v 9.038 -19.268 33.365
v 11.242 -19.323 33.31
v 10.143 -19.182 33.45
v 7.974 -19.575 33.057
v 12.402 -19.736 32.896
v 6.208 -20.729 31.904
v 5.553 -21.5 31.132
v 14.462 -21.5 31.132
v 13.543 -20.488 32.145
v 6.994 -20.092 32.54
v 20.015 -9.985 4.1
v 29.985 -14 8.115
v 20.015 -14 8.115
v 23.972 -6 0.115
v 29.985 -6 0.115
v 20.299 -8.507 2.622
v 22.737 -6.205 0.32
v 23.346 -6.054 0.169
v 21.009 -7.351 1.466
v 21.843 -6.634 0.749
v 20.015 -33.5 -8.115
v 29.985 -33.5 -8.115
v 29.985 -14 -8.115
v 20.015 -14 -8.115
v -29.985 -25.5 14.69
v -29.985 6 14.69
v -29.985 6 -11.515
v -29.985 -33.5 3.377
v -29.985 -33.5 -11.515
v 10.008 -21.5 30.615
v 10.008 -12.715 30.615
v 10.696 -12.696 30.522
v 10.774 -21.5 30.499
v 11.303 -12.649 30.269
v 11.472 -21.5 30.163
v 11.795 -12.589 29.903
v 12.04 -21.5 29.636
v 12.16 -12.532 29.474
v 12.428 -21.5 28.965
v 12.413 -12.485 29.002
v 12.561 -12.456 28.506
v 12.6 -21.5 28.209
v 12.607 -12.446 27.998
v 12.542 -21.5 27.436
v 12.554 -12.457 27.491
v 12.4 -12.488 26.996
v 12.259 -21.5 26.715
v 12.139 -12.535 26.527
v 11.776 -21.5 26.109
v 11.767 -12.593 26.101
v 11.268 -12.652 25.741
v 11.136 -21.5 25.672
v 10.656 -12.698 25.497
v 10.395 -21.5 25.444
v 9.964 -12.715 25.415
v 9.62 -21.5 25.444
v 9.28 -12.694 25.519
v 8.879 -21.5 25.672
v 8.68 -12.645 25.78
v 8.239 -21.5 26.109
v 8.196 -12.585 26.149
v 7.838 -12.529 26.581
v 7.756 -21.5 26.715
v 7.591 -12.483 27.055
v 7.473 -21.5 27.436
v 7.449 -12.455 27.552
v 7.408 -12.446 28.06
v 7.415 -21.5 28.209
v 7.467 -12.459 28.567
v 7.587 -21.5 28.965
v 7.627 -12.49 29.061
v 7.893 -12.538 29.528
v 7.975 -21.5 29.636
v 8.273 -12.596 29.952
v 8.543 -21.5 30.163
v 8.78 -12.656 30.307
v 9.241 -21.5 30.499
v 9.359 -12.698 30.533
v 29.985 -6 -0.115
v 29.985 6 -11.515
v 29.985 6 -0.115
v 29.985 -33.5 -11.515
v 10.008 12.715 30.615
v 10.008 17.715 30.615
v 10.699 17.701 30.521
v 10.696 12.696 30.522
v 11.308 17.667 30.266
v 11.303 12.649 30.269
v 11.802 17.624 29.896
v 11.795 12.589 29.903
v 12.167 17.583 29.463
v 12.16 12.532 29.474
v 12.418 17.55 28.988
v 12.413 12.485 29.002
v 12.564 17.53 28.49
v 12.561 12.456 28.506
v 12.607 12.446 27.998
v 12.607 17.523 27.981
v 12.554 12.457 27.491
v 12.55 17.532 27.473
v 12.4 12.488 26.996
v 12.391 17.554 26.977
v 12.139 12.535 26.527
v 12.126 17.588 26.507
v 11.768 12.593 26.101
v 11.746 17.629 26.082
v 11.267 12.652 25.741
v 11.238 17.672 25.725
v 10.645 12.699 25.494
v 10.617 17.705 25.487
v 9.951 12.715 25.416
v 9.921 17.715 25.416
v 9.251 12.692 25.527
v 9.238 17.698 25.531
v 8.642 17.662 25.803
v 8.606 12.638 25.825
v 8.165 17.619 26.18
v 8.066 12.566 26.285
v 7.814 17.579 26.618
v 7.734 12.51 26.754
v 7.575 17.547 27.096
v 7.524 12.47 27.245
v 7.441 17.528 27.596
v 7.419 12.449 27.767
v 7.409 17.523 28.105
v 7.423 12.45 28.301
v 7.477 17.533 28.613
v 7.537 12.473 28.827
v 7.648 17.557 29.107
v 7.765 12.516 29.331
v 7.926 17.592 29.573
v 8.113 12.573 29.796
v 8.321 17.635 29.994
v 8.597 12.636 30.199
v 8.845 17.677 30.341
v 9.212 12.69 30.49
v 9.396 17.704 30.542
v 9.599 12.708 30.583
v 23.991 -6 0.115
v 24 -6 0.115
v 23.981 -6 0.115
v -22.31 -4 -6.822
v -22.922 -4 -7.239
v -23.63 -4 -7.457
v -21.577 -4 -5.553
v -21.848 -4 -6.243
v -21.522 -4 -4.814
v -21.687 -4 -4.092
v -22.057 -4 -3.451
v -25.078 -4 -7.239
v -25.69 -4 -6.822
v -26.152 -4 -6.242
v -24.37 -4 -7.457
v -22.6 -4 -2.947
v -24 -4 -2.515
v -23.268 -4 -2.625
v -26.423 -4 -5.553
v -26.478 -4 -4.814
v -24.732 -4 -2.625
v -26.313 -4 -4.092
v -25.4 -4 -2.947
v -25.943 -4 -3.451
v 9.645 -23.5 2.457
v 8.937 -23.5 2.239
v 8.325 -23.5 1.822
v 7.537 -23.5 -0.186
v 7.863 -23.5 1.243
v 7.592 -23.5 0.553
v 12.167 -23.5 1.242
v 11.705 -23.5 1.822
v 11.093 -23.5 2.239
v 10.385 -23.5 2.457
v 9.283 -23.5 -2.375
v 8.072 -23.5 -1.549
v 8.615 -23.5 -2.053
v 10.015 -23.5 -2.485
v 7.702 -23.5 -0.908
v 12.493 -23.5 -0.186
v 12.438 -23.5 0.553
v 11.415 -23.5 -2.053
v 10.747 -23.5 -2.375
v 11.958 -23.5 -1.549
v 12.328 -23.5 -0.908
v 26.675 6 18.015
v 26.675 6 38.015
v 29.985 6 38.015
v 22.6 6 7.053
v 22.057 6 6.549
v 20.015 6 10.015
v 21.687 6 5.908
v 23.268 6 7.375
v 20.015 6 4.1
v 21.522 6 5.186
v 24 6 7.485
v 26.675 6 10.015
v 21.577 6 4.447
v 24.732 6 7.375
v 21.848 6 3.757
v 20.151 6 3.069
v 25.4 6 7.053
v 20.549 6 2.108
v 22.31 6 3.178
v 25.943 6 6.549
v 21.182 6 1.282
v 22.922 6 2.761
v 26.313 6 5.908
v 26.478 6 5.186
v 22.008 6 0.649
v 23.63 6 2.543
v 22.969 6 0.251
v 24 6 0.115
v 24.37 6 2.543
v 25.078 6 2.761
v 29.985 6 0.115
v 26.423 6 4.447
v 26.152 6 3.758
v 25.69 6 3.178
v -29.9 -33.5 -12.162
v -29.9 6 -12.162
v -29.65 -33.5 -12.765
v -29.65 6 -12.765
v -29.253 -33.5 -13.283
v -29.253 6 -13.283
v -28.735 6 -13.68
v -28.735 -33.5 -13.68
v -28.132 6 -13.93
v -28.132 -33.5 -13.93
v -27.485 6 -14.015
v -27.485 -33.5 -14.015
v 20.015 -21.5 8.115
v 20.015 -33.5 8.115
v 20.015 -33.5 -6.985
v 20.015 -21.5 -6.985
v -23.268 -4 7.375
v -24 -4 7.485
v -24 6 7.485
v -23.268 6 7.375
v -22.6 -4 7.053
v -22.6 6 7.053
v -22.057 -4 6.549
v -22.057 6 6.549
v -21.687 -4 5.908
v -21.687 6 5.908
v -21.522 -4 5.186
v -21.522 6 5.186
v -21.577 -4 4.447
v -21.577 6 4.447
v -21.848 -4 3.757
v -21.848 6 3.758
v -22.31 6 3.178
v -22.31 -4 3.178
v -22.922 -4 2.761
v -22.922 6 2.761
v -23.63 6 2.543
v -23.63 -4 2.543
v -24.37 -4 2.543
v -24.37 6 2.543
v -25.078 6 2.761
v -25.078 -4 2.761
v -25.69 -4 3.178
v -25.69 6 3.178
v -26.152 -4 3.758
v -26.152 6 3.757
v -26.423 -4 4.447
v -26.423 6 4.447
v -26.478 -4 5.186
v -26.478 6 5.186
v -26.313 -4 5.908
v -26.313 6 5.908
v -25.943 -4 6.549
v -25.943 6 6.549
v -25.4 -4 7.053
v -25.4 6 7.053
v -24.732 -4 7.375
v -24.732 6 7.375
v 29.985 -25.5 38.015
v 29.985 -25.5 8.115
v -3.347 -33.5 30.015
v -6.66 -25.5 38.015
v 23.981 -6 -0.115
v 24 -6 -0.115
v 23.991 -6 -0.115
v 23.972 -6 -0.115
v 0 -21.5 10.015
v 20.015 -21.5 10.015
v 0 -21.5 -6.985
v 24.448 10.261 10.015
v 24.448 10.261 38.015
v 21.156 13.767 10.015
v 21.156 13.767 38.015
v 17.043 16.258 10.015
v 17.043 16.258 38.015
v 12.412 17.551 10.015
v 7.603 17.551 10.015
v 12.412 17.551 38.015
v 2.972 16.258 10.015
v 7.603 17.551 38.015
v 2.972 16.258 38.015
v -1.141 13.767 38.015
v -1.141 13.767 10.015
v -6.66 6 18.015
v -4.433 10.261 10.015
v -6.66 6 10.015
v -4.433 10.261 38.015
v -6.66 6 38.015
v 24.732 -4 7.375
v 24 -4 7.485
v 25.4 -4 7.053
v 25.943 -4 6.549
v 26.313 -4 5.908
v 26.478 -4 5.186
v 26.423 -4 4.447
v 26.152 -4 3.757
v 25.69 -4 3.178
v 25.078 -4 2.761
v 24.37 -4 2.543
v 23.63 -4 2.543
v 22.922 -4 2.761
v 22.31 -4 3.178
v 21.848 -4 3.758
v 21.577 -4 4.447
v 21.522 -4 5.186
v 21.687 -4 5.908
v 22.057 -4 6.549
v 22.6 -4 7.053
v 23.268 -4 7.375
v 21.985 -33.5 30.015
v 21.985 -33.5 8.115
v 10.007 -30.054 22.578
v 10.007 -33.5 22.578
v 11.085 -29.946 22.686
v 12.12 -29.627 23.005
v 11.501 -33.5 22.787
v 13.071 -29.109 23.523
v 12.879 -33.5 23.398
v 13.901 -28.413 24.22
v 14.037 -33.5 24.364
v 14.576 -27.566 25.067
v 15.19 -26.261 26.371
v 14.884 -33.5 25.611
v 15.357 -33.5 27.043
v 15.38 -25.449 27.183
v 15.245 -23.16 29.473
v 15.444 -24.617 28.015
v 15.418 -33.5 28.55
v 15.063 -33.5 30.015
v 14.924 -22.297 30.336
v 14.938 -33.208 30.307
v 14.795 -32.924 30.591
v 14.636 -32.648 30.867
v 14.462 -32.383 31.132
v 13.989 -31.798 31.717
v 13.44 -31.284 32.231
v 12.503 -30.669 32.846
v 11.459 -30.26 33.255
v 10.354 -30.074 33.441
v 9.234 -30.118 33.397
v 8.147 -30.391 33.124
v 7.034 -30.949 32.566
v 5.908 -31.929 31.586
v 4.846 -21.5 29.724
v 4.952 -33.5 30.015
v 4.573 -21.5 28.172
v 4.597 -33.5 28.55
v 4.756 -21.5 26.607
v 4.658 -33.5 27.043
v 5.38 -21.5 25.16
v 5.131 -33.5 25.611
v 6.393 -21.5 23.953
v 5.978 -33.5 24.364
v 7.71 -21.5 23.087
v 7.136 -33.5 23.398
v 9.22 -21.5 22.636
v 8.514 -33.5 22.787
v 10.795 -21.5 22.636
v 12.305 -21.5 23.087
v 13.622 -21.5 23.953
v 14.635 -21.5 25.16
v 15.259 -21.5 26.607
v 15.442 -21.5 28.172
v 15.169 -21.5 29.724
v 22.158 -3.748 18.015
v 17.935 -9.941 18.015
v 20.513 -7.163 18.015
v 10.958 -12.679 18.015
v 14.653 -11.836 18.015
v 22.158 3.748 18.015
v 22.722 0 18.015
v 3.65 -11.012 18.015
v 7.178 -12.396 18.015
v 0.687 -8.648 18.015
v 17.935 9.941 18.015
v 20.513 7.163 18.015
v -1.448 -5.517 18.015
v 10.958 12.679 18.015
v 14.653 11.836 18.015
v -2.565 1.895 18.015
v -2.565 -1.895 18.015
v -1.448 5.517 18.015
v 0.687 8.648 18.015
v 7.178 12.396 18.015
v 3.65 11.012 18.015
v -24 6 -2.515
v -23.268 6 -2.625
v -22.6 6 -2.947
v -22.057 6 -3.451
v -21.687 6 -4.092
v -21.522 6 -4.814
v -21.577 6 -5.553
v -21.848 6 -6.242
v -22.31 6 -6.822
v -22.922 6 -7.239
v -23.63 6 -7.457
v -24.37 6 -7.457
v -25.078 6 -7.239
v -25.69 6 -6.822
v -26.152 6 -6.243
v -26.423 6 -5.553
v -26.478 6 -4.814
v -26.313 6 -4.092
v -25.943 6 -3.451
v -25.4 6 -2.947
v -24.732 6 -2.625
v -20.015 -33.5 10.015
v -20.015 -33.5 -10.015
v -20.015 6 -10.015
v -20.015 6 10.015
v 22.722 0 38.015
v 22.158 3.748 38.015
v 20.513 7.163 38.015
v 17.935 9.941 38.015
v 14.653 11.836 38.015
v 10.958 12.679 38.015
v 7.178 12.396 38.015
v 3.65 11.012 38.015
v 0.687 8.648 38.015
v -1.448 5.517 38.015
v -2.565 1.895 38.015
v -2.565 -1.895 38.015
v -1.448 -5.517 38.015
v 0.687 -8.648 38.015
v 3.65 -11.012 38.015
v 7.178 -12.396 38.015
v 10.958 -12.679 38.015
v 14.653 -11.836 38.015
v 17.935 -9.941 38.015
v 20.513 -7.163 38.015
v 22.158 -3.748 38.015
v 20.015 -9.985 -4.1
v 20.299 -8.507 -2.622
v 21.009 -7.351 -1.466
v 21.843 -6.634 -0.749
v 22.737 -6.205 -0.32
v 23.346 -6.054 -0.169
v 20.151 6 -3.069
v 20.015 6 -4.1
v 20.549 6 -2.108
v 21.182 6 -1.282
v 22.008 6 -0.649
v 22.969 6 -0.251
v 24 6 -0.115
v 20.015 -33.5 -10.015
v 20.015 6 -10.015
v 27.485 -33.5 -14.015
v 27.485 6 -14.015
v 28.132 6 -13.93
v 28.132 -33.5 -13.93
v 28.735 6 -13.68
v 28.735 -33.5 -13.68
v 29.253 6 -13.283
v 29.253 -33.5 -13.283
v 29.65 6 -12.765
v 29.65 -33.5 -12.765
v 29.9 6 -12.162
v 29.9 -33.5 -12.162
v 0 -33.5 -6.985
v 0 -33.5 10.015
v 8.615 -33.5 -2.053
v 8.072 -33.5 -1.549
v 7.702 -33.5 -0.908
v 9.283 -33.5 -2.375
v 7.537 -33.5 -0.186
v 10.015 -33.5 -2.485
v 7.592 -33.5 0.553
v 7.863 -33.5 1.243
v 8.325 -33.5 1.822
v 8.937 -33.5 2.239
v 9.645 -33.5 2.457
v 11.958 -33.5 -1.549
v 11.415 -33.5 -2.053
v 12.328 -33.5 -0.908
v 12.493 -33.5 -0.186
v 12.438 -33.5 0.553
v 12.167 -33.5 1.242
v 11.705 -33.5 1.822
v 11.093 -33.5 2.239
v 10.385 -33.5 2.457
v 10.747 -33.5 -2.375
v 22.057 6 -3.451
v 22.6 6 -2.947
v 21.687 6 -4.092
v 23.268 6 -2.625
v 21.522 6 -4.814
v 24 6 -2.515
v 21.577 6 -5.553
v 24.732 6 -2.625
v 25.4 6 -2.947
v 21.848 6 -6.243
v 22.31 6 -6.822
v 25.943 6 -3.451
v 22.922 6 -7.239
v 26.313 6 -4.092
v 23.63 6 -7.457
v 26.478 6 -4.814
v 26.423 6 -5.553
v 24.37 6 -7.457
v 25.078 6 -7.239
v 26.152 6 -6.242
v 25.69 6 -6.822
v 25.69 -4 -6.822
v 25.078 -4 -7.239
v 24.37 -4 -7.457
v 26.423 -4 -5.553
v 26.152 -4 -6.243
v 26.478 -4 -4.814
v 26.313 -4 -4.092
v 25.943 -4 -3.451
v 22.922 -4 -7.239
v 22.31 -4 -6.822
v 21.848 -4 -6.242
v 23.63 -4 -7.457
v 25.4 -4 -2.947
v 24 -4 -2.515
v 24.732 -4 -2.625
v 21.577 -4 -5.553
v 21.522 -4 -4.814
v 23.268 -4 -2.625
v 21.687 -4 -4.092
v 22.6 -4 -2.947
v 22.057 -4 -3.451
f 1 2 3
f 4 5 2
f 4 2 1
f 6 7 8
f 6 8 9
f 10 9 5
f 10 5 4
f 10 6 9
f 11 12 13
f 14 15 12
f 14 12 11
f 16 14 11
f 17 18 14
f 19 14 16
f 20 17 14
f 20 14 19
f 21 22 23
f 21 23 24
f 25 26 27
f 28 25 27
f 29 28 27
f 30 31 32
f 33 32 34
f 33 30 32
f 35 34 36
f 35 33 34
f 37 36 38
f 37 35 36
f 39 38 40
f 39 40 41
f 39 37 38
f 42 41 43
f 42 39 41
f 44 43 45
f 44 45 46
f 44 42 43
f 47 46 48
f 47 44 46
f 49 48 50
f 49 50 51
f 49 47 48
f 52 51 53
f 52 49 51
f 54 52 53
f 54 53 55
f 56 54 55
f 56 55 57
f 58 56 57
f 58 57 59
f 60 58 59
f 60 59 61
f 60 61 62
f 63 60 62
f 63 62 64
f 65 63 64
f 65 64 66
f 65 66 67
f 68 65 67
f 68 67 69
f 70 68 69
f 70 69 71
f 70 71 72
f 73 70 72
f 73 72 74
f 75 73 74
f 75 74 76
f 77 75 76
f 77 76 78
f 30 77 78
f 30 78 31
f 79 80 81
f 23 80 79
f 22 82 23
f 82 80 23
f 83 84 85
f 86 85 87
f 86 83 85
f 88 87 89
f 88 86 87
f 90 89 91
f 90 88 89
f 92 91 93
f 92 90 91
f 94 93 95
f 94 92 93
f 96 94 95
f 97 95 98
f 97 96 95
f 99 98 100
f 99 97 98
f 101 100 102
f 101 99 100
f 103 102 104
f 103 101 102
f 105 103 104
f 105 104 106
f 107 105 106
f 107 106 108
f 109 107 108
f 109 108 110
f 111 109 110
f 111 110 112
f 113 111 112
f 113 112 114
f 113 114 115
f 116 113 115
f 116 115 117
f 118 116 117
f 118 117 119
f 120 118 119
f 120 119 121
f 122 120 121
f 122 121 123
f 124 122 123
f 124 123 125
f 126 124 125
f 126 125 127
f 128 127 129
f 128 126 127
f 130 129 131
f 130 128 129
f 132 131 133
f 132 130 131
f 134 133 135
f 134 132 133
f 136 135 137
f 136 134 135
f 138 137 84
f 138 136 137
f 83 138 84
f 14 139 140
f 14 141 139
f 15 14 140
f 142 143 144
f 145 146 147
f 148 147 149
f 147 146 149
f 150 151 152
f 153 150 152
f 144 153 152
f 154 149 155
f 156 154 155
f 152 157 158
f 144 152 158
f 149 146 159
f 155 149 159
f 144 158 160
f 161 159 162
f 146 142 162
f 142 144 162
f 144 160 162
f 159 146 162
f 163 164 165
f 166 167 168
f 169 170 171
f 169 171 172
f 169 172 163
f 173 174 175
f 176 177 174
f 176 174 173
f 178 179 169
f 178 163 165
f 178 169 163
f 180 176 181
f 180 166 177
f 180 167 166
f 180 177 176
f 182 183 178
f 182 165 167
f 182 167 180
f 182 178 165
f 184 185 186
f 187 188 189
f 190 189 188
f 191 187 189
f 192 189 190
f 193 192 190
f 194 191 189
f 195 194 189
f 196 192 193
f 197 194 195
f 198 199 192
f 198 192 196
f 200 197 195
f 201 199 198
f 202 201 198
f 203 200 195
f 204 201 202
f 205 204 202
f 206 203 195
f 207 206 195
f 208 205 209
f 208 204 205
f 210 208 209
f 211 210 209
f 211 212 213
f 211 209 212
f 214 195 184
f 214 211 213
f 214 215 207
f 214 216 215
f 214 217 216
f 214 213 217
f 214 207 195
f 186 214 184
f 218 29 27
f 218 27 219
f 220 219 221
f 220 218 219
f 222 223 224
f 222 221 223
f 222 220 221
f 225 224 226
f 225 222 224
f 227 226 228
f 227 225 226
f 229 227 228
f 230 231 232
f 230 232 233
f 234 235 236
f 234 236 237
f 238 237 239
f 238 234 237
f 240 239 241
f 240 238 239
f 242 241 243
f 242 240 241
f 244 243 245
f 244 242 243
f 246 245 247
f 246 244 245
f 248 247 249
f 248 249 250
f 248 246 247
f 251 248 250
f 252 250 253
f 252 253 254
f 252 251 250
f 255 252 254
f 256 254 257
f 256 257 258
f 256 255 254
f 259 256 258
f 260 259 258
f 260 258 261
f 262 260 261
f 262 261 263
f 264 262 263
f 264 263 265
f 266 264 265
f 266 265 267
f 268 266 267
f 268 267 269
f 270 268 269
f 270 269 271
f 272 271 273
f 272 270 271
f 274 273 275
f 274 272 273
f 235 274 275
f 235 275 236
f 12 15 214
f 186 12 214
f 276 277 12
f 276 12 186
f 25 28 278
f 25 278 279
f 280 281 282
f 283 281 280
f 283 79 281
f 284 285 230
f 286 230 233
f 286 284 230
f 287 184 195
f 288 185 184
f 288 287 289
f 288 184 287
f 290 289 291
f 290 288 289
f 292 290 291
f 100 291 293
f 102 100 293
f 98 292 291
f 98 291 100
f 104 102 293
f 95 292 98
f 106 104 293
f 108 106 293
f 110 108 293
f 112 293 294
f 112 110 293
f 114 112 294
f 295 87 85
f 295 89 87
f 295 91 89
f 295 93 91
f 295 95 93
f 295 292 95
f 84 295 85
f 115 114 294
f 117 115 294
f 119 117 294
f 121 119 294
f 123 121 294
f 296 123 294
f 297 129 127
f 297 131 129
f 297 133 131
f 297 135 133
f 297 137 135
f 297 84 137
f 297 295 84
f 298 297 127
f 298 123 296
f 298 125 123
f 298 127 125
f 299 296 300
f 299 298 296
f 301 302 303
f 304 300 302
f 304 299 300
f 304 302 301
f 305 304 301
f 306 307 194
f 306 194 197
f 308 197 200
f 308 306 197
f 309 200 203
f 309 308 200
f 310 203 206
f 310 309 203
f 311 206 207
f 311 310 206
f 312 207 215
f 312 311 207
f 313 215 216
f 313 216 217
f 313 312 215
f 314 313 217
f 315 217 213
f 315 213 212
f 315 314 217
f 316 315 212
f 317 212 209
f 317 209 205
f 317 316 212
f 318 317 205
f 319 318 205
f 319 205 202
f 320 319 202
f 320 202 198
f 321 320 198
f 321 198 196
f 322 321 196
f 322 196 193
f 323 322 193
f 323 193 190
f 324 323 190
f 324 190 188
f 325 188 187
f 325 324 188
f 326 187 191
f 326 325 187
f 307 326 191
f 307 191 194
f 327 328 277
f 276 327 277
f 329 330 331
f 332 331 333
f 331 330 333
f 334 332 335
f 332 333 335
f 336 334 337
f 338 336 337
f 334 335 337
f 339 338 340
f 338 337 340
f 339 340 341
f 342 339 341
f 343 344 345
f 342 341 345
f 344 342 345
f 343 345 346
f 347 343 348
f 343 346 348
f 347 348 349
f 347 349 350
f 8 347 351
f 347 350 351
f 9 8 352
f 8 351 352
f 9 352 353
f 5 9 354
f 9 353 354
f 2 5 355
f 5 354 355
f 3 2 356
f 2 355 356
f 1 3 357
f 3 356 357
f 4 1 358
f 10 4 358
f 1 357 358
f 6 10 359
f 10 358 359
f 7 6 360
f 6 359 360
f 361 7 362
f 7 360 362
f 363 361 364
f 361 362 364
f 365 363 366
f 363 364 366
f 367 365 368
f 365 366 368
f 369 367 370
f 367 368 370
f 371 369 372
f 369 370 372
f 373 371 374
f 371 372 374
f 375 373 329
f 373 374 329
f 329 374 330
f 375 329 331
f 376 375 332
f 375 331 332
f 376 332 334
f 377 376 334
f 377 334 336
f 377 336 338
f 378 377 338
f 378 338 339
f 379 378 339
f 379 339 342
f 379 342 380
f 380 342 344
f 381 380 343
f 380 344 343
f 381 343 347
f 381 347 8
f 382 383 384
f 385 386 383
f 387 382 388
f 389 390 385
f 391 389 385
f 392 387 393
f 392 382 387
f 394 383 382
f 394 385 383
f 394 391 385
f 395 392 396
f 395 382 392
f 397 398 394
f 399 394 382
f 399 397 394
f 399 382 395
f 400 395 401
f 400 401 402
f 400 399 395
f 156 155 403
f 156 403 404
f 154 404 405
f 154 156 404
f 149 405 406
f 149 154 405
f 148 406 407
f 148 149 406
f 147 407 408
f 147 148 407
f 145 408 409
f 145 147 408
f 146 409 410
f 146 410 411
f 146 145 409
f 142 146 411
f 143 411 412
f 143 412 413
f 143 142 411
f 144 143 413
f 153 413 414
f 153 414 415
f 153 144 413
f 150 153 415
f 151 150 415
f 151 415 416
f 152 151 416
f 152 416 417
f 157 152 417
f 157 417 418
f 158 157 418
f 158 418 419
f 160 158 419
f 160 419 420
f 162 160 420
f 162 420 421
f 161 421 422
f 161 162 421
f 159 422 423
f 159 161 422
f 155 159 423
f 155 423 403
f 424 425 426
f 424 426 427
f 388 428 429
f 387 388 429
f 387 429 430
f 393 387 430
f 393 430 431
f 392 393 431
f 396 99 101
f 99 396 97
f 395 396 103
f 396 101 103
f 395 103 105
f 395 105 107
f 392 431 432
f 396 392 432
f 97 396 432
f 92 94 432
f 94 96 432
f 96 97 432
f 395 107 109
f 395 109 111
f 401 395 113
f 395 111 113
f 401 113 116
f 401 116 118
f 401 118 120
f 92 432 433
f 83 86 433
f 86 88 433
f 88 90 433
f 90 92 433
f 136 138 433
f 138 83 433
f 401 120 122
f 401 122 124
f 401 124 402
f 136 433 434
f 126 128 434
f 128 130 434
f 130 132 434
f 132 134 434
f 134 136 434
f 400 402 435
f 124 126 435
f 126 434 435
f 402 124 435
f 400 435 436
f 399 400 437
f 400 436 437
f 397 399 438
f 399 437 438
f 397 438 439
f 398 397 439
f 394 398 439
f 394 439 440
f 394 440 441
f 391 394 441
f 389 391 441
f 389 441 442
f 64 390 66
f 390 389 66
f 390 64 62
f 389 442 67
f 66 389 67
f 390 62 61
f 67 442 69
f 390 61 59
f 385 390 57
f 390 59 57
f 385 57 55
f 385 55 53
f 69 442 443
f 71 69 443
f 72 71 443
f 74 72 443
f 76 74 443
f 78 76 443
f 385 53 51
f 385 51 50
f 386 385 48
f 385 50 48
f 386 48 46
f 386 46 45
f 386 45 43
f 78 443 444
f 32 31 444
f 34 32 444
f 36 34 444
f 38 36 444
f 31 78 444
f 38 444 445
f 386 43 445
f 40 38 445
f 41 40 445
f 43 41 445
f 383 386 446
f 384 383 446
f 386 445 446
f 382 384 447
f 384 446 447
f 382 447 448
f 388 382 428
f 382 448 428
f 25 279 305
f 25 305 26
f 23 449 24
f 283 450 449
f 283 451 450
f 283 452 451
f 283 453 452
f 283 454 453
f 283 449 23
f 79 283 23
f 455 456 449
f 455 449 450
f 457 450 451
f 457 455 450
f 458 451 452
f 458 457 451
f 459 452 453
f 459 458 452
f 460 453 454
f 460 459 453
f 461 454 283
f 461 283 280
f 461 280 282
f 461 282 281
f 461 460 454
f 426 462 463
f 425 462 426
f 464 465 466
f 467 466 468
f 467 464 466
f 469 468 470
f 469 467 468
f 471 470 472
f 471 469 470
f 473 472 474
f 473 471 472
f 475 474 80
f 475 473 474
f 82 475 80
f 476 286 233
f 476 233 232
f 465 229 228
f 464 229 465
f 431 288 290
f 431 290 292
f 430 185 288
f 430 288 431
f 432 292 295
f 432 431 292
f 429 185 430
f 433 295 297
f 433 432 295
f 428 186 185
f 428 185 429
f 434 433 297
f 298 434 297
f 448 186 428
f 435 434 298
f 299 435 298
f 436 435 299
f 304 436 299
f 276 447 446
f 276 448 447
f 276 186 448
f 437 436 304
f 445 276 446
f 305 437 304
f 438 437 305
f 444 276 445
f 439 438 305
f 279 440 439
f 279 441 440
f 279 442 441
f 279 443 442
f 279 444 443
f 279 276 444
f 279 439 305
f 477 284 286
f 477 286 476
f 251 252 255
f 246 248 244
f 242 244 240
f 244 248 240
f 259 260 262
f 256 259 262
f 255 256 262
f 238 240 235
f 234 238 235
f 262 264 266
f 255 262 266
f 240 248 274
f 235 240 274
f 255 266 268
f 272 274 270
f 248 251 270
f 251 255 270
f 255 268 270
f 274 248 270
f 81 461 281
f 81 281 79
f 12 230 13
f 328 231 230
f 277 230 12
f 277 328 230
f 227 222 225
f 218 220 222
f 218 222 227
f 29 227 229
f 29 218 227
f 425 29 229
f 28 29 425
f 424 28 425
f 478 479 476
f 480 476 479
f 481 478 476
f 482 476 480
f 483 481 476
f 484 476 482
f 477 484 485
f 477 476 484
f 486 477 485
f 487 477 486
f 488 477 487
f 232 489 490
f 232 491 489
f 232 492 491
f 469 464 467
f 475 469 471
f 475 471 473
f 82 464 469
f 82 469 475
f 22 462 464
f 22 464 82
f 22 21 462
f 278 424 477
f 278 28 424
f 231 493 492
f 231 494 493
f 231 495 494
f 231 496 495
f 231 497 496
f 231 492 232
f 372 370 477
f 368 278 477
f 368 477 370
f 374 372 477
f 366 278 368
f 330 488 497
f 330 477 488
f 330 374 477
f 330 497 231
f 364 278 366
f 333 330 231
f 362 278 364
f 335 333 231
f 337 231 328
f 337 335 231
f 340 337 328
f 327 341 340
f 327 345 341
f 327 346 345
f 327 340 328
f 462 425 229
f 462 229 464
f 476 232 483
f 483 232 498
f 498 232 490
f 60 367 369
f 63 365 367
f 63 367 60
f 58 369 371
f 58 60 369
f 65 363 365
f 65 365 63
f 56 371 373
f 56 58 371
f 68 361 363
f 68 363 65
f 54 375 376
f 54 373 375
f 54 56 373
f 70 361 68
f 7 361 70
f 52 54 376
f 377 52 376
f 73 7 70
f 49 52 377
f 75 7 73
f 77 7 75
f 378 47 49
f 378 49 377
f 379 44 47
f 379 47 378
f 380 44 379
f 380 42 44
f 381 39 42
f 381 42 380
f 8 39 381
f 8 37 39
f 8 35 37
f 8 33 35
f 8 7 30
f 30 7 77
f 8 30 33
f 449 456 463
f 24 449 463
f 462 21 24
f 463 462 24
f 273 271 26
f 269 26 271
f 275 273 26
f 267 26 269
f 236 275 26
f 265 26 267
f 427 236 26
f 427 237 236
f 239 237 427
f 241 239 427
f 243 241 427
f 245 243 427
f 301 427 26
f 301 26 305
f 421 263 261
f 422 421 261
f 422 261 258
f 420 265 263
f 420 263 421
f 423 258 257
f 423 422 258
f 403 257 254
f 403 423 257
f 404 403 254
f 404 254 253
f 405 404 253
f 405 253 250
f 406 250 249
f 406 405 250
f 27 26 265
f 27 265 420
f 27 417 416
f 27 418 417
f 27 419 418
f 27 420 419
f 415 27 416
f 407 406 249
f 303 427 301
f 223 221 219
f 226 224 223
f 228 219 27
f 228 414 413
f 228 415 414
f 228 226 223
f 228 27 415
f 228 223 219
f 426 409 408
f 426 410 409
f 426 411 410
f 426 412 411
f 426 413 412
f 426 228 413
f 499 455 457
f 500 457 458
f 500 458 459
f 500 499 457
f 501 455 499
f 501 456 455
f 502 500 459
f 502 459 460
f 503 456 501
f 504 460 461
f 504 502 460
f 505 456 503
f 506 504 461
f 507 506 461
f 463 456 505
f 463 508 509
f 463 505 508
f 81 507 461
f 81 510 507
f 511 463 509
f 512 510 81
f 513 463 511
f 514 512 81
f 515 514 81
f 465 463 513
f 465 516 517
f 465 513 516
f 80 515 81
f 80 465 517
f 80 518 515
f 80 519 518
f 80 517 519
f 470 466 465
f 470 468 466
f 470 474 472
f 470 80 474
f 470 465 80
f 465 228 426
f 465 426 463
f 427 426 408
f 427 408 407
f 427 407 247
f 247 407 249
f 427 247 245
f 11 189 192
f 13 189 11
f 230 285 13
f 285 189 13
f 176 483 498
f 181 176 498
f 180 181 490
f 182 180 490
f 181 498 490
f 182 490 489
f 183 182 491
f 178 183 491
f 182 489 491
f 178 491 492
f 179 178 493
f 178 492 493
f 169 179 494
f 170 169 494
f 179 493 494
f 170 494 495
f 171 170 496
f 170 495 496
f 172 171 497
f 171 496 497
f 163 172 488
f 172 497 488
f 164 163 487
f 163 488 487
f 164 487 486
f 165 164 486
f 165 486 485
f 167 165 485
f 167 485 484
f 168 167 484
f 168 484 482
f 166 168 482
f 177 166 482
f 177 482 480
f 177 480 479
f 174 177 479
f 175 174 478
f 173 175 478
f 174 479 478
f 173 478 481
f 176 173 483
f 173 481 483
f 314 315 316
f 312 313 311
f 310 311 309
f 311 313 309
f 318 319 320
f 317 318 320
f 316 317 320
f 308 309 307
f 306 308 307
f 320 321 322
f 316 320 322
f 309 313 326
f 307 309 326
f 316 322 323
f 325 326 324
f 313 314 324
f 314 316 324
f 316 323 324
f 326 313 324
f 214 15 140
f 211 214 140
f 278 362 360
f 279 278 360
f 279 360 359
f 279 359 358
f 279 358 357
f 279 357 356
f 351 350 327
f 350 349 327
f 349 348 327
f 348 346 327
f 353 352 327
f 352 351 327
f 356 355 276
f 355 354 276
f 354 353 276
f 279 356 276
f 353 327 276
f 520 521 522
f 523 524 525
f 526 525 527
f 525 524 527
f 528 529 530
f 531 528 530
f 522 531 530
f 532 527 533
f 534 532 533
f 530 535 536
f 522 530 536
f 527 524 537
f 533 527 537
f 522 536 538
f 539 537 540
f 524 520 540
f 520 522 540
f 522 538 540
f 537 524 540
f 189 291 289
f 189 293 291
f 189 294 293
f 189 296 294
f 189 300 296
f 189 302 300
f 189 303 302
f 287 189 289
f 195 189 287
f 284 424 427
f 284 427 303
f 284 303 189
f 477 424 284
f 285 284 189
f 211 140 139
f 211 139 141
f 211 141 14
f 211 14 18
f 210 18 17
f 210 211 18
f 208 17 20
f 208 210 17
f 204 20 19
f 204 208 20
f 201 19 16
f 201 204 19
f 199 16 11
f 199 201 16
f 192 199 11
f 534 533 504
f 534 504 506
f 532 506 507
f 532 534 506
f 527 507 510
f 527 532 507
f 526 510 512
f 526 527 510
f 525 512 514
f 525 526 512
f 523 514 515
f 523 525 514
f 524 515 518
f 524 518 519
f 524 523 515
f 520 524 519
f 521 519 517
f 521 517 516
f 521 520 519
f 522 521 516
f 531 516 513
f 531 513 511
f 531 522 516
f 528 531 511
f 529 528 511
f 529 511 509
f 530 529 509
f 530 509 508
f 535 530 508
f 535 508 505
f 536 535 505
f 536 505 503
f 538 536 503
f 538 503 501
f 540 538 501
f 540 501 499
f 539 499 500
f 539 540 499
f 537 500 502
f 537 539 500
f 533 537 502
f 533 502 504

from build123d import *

# Parameters (mm, degrees)
SKETCH1_R               = 2.485
SKETCH1_W               = 55.97
SKETCH1_H               = 4
SKETCH1_W_2             = 2
BOSS_EXTRUDE1_DEPTH     = 6
SKETCH2_R               = 2.485
BOSS_EXTRUDE2_DEPTH     = 2
BOSS_EXTRUDE3_DEPTH     = 20.015
SKETCH6_R               = 2.485
CUT_EXTRUDE3_DEPTH      = 10
SKETCH11_R              = 17.715
BOSS_EXTRUDE4_DEPTH     = 8
BOSS_EXTRUDE5_START     = 20
SKETCH11_3_R            = 17.715
SKETCH11_3_R_2          = 12.715
BOSS_EXTRUDE5_DEPTH     = 20
BOSS_EXTRUDE7_DEPTH     = 20
CUT_EXTRUDE7_DEPTH      = 63.485922014
CUT_EXTRUDE7_DEPTH_BACK = 63.485922014
CUT_EXTRUDE8_DEPTH      = 72.185604057
CUT_EXTRUDE8_DEPTH_BACK = 72.185604057
FILLET1_R               = 2.5
CUT_EXTRUDE9_DEPTH      = 59.876909311
CUT_EXTRUDE9_DEPTH_BACK = 59.876909311
SKETCH16_R              = 2.6
SKETCH17_R              = 5.436873337
SKETCH17_R_2            = 2.6
CUT_EXTRUDE10_DEPTH     = 12
BOSS_EXTRUDE8_REACH     = 72.478
SKETCH18_R              = 5.436873337
CHAMFER1_SIZE           = 8
CHAMFER2_SIZE           = 8


# Some blends are built 0.0001 mm under size
with BuildPart() as part:
    # Sketch1 → Boss-Extrude1 (new, symmetric)
    # profile 1 of 8: a face of its own
    with BuildSketch(Plane(origin=(0, 0, 0), x_dir=(1, 0, 0), z_dir=(0, 1, 0))):
        with BuildLine():
            ThreePointArc((24, -0.115), (21.182179477, -1.282179477), (20.015, -4.1))
            Line((20.015, -4.1), (20.015, -10.015))
            Line((20.015, -10.015), (-20.015, -10.015))
            Line((-20.015, -10.015), (-20.015, 10.015))
            Line((-20.015, 10.015), (20.015, 10.015))
            Line((20.015, 10.015), (20.015, 4.1))
            ThreePointArc((20.015, 4.1), (21.182179477, 1.282179477), (24, 0.115))
            ThreePointArc((24, 0.115), (26.817820523, 1.282179477), (27.985, 4.1))
            Line((27.985, 4.1), (27.985, 14.015))
            Line((27.985, 14.015), (-27.985, 14.015))
            Line((-27.985, 14.015), (-27.985, -14.015))
            Line((-27.985, -14.015), (27.985, -14.015))
            Line((27.985, -14.015), (27.985, -4.1))
            ThreePointArc((27.985, -4.1), (26.817820523, -1.282179477), (24, -0.115))
        make_face()
        with Locations(Location((-24, -5, 0), (0, 0, 270))):
            Circle(SKETCH1_R, mode=Mode.SUBTRACT)
        with Locations(Location((-24, 5, 0), (0, 0, 270))):
            Circle(SKETCH1_R, mode=Mode.SUBTRACT)
        with Locations(Location((24, -5, 0), (0, 0, 270))):
            Circle(SKETCH1_R, mode=Mode.SUBTRACT)
        with Locations(Location((24, 5, 0), (0, 0, 270))):
            Circle(SKETCH1_R, mode=Mode.SUBTRACT)
    # profile 2 of 8: a face of its own
    with BuildSketch(Plane(origin=(0, 0, 0), x_dir=(1, 0, 0), z_dir=(0, 1, 0))):
        with Locations((0, -16.015)):
            Rectangle(SKETCH1_W, SKETCH1_H)
    # profile 3 of 8: a face of its own
    with BuildSketch(Plane(origin=(0, 0, 0), x_dir=(1, 0, 0), z_dir=(0, 1, 0))):
        Polygon((27.985, 4.1), (27.985, 0.115), (29.985, 0.115), (29.985, 14.015), (27.985, 14.015), align=None)
    # profile 4 of 8: a face of its own
    with BuildSketch(Plane(origin=(0, 0, 0), x_dir=(1, 0, 0), z_dir=(0, 1, 0))):
        Polygon((29.985, -0.115), (27.985, -0.115), (27.985, -4.1), (27.985, -14.015), (29.985, -14.015), align=None)
    # profile 5 of 8: a face of its own
    with BuildSketch(Plane(origin=(0, 0, 0), x_dir=(1, 0, 0), z_dir=(0, 1, 0))):
        with BuildLine():
            Line((27.985, -4.1), (27.985, -0.115))
            Line((27.985, -0.115), (24, -0.115))
            ThreePointArc((24, -0.115), (26.817820523, -1.282179477), (27.985, -4.1))
        make_face()
    # profile 6 of 8: a face of its own
    with BuildSketch(Plane(origin=(0, 0, 0), x_dir=(1, 0, 0), z_dir=(0, 1, 0))):
        with BuildLine():
            Line((24, 0.115), (27.985, 0.115))
            Line((27.985, 0.115), (27.985, 4.1))
            ThreePointArc((27.985, 4.1), (26.817820523, 1.282179477), (24, 0.115))
        make_face()
    # profile 7 of 8: a face of its own
    with BuildSketch(Plane(origin=(0, 0, 0), x_dir=(1, 0, 0), z_dir=(0, 1, 0))):
        with Locations((28.985, -16.015)):
            Rectangle(SKETCH1_W_2, SKETCH1_H)
    # profile 8 of 8: a face of its own
    with BuildSketch(Plane(origin=(0, 0, 0), x_dir=(1, 0, 0), z_dir=(0, 1, 0))):
        Polygon((-29.985, 14.015), (-29.985, -18.015), (-27.985, -18.015), (-27.985, -14.015), (-27.985, 14.015), align=None)
    extrude(amount=BOSS_EXTRUDE1_DEPTH, both=True)

    # Sketch2 → Boss-Extrude2 (add)
    with BuildSketch(Plane.XZ.offset(6)):
        with Locations(Location((24, -5, 0), (0, 0, 90))):
            Circle(SKETCH2_R)
        with Locations(Location((24, 5, 0), (0, 0, 90))):
            Circle(SKETCH2_R)
        with Locations(Location((-24, -5, 0), (0, 0, 90))):
            Circle(SKETCH2_R)
        with Locations(Location((-24, 5, 0), (0, 0, 90))):
            Circle(SKETCH2_R)
    extrude(amount=-BOSS_EXTRUDE2_DEPTH)

    # Sketch5 → Boss-Extrude3 (add)
    with BuildSketch(Plane(origin=(0, 0, 0), x_dir=(0, 0, -1), z_dir=(1, 0, 0))):
        Polygon((-18.015, -6), (-10.015, -6), (-10.015, -21.5), (6.985, -21.5), (6.985, -33.5), (-18.015, -33.5), align=None)
    extrude(amount=BOSS_EXTRUDE3_DEPTH)

    # Sketch6 → Cut-Extrude3 (cut)
    with BuildSketch(Plane.XZ.offset(33.5)):
        with Locations(Location((10.015, 0, 0), (0, 0, 270))):
            Circle(SKETCH6_R)
    extrude(amount=-CUT_EXTRUDE3_DEPTH, mode=Mode.SUBTRACT)

    # Sketch11 → Boss-Extrude4 (add)
    with BuildSketch(Plane.XY.offset(18.015)):
        with Locations((10.0075, 0)):
            Circle(SKETCH11_R)
    extrude(amount=-BOSS_EXTRUDE4_DEPTH)

    # Sketch11<3> → Boss-Extrude5 (add)
    with BuildSketch(Plane.XY.offset(18.015).offset(BOSS_EXTRUDE5_START)):
        with Locations((10.0075, 0)):
            Circle(SKETCH11_3_R)
        with Locations((10.0075, 0)):
            Circle(SKETCH11_3_R_2, mode=Mode.SUBTRACT)
    extrude(amount=-BOSS_EXTRUDE5_DEPTH)

    # Sketch13 → Boss-Extrude7 (add)
    with BuildSketch(Plane.XY.offset(38.015)):
        with BuildLine():
            ThreePointArc((20.015, -14.617495297), (10.0075, -17.715), (0, -14.617495297))
            Line((0, -14.617495297), (0, -33.5))
            Line((0, -33.5), (20.015, -33.5))
            Line((20.015, -33.5), (20.015, -14.617495297))
        make_face()
        with BuildLine():
            Line((-29.985, -6), (-6.660470032, -6))
            ThreePointArc((-6.660470032, -6), (-7.7075, 0), (-6.660470032, 6))
            Line((-6.660470032, 6), (-29.985, 6))
            Line((-29.985, 6), (-29.985, -6))
        make_face()
        with BuildLine():
            ThreePointArc((27.7225, 0), (27.458779525, -3.045335439), (26.675470032, -6))
            Line((26.675470032, -6), (29.985, -6))
            Line((29.985, -6), (29.985, 6))
            Line((29.985, 6), (26.675470032, 6))
            ThreePointArc((26.675470032, 6), (27.458779525, 3.045335439), (27.7225, 0))
        make_face()
    extrude(amount=-BOSS_EXTRUDE7_DEPTH)

    # Sketch14 → Cut-Extrude7 (cut, two sides: drawn at the far end of the back side and taken through both)
    with BuildSketch(Plane(origin=(0, 6, 0), x_dir=(1, 0, 0), z_dir=(0, 1, 0)).offset(-CUT_EXTRUDE7_DEPTH_BACK)):
        Polygon((-29.985, -38.015), (-6.660470032, -38.015), (-29.985, -14.690470032), align=None)
    extrude(amount=CUT_EXTRUDE7_DEPTH + CUT_EXTRUDE7_DEPTH_BACK, mode=Mode.SUBTRACT)

    # Sketch15 → Cut-Extrude8 (cut, two sides: drawn at the far end of the back side and taken through both)
    with BuildSketch(Plane(origin=(20.015, 0, 0), x_dir=(0, 0, -1), z_dir=(1, 0, 0)).offset(-CUT_EXTRUDE8_DEPTH_BACK)):
        Polygon((-19.132495297, -33.5), (-38.015, -14.617495297), (-38.015, -33.5), align=None)
    extrude(amount=CUT_EXTRUDE8_DEPTH + CUT_EXTRUDE8_DEPTH_BACK, mode=Mode.SUBTRACT)

    # Fillet1
    fillet1_edges = [part.edges().sort_by_distance(p)[0] for p in [
        (-29.985, 0, -14.015),
        (29.985, 0, -14.015),
    ]]
    fillet(fillet1_edges, radius=FILLET1_R)

    # Sketch16 → Cut-Extrude9 (cut, two sides: drawn at the far end of the back side and taken through both)
    with BuildSketch(Plane(origin=(0, 0, 0), x_dir=(1, 0, 0), z_dir=(0, 1, 0)).offset(-CUT_EXTRUDE9_DEPTH_BACK)):
        with Locations(Location((10.0075, -28.015, 0), (0, 0, 270))):
            Circle(SKETCH16_R)
    extrude(amount=CUT_EXTRUDE9_DEPTH + CUT_EXTRUDE9_DEPTH_BACK, mode=Mode.SUBTRACT)

    # Sketch17 → Cut-Extrude10 (cut)
    with BuildSketch(Plane.XZ.offset(33.5)):
        with Locations((10.0075, 28.015)):
            Circle(SKETCH17_R)
        with Locations(Location((10.0075, 28.015, 0), (0, 0, 90))):
            Circle(SKETCH17_R_2, mode=Mode.SUBTRACT)
    extrude(amount=-CUT_EXTRUDE10_DEPTH, mode=Mode.SUBTRACT)

    # Sketch18 → Boss-Extrude8 (add, up to next)
    with BuildSketch(Plane.XZ.offset(33.5), mode=Mode.PRIVATE) as boss_extrude8_sk1:
        with BuildLine():
            Line((29.985, 38.015), (-6.660470032, 38.015))
            Line((-6.660470032, 38.015), (-29.985, 14.690470032))
            Line((-29.985, 14.690470032), (-29.985, -11.515))
            ThreePointArc((-29.985, -11.515), (-29.252766953, -13.282766953), (-27.485, -14.015))
            Line((-27.485, -14.015), (27.485, -14.015))
            ThreePointArc((27.485, -14.015), (29.252766953, -13.282766953), (29.985, -11.515))
            Line((29.985, -11.515), (29.985, -8.115))
            Line((29.985, -8.115), (20.015, -8.115))
            Line((20.015, -8.115), (20.015, -10.015))
            Line((20.015, -10.015), (-20.015, -10.015))
            Line((-20.015, -10.015), (-20.015, 10.015))
            Line((-20.015, 10.015), (0, 10.015))
            Line((0, 10.015), (0, 19.132495297))
            Line((0, 19.132495297), (20.015, 19.132495297))
            Line((20.015, 19.132495297), (20.015, 10.015))
            Line((20.015, 10.015), (20.015, 8.115))
            Line((20.015, 8.115), (29.985, 8.115))
            Line((29.985, 8.115), (29.985, 38.015))
        make_face()
        with Locations(Location((10.0075, 28.015, 0), (0, 0, 270))):
            Circle(SKETCH18_R, mode=Mode.SUBTRACT)
    boss_extrude8_tool1 = extrude(boss_extrude8_sk1.sketch, amount=-BOSS_EXTRUDE8_REACH, mode=Mode.PRIVATE) - part.part
    add(boss_extrude8_tool1.solids().sort_by_distance((-0.47266, -33.5, 14.933652))[0])

    # Chamfer1
    chamfer1_edges = [part.edges().sort_by_distance(p)[0] for p in [
        (25, -6, -8.115),
        (25, -6, 8.115),
    ]]
    chamfer(chamfer1_edges, length=CHAMFER1_SIZE - 0.0001)  # a hair under: the kernel refuses the full size

    # Chamfer2
    # the kernel refuses this chamfer: 8 mm, written as the material it takes off along each edge
    with BuildSketch(Plane(origin=(29.985, -33.5, 8.115), x_dir=(-0.9996219169112968, -0.027495876610586487, 0), z_dir=(0, 0, 1))) as chamfer2_piece_1:
        Polygon((CHAMFER2_SIZE * 0.999621916911, -CHAMFER2_SIZE * 0.0274958766106), (-CHAMFER2_SIZE * 0.0274958766106, -CHAMFER2_SIZE * 0.999621916911), (0, 0), align=None)
    extrude(amount=50.473463904, mode=Mode.SUBTRACT)
    with BuildSketch(Plane(origin=(50.558463904, -33.5, 38.015), x_dir=(0, -0.027495876610586487, -0.9996219169112968), z_dir=(-1, 0, 0))) as chamfer2_piece_2:
        Polygon((CHAMFER2_SIZE * 0.999621916911, -CHAMFER2_SIZE * 0.0274958766106), (-CHAMFER2_SIZE * 0.0274958766106, -CHAMFER2_SIZE * 0.999621916911), (0, 0), align=None)
    extrude(amount=77.79239784, mode=Mode.SUBTRACT)
    with BuildSketch(Plane(origin=(7.887165806, -33.5, 52.562635839), x_dir=(0.7068394360706746, -0.027495876610586497, -0.7068394360706723), z_dir=(-0.7071067811865466, 0, -0.7071067811865486))) as chamfer2_piece_3:
        Polygon((CHAMFER2_SIZE * 0.999621916911, -CHAMFER2_SIZE * 0.0274958766106), (-CHAMFER2_SIZE * 0.0274958766106, -CHAMFER2_SIZE * 0.999621916911), (0, 0), align=None)
    extrude(amount=74.132794424, mode=Mode.SUBTRACT)


solid = part.part
